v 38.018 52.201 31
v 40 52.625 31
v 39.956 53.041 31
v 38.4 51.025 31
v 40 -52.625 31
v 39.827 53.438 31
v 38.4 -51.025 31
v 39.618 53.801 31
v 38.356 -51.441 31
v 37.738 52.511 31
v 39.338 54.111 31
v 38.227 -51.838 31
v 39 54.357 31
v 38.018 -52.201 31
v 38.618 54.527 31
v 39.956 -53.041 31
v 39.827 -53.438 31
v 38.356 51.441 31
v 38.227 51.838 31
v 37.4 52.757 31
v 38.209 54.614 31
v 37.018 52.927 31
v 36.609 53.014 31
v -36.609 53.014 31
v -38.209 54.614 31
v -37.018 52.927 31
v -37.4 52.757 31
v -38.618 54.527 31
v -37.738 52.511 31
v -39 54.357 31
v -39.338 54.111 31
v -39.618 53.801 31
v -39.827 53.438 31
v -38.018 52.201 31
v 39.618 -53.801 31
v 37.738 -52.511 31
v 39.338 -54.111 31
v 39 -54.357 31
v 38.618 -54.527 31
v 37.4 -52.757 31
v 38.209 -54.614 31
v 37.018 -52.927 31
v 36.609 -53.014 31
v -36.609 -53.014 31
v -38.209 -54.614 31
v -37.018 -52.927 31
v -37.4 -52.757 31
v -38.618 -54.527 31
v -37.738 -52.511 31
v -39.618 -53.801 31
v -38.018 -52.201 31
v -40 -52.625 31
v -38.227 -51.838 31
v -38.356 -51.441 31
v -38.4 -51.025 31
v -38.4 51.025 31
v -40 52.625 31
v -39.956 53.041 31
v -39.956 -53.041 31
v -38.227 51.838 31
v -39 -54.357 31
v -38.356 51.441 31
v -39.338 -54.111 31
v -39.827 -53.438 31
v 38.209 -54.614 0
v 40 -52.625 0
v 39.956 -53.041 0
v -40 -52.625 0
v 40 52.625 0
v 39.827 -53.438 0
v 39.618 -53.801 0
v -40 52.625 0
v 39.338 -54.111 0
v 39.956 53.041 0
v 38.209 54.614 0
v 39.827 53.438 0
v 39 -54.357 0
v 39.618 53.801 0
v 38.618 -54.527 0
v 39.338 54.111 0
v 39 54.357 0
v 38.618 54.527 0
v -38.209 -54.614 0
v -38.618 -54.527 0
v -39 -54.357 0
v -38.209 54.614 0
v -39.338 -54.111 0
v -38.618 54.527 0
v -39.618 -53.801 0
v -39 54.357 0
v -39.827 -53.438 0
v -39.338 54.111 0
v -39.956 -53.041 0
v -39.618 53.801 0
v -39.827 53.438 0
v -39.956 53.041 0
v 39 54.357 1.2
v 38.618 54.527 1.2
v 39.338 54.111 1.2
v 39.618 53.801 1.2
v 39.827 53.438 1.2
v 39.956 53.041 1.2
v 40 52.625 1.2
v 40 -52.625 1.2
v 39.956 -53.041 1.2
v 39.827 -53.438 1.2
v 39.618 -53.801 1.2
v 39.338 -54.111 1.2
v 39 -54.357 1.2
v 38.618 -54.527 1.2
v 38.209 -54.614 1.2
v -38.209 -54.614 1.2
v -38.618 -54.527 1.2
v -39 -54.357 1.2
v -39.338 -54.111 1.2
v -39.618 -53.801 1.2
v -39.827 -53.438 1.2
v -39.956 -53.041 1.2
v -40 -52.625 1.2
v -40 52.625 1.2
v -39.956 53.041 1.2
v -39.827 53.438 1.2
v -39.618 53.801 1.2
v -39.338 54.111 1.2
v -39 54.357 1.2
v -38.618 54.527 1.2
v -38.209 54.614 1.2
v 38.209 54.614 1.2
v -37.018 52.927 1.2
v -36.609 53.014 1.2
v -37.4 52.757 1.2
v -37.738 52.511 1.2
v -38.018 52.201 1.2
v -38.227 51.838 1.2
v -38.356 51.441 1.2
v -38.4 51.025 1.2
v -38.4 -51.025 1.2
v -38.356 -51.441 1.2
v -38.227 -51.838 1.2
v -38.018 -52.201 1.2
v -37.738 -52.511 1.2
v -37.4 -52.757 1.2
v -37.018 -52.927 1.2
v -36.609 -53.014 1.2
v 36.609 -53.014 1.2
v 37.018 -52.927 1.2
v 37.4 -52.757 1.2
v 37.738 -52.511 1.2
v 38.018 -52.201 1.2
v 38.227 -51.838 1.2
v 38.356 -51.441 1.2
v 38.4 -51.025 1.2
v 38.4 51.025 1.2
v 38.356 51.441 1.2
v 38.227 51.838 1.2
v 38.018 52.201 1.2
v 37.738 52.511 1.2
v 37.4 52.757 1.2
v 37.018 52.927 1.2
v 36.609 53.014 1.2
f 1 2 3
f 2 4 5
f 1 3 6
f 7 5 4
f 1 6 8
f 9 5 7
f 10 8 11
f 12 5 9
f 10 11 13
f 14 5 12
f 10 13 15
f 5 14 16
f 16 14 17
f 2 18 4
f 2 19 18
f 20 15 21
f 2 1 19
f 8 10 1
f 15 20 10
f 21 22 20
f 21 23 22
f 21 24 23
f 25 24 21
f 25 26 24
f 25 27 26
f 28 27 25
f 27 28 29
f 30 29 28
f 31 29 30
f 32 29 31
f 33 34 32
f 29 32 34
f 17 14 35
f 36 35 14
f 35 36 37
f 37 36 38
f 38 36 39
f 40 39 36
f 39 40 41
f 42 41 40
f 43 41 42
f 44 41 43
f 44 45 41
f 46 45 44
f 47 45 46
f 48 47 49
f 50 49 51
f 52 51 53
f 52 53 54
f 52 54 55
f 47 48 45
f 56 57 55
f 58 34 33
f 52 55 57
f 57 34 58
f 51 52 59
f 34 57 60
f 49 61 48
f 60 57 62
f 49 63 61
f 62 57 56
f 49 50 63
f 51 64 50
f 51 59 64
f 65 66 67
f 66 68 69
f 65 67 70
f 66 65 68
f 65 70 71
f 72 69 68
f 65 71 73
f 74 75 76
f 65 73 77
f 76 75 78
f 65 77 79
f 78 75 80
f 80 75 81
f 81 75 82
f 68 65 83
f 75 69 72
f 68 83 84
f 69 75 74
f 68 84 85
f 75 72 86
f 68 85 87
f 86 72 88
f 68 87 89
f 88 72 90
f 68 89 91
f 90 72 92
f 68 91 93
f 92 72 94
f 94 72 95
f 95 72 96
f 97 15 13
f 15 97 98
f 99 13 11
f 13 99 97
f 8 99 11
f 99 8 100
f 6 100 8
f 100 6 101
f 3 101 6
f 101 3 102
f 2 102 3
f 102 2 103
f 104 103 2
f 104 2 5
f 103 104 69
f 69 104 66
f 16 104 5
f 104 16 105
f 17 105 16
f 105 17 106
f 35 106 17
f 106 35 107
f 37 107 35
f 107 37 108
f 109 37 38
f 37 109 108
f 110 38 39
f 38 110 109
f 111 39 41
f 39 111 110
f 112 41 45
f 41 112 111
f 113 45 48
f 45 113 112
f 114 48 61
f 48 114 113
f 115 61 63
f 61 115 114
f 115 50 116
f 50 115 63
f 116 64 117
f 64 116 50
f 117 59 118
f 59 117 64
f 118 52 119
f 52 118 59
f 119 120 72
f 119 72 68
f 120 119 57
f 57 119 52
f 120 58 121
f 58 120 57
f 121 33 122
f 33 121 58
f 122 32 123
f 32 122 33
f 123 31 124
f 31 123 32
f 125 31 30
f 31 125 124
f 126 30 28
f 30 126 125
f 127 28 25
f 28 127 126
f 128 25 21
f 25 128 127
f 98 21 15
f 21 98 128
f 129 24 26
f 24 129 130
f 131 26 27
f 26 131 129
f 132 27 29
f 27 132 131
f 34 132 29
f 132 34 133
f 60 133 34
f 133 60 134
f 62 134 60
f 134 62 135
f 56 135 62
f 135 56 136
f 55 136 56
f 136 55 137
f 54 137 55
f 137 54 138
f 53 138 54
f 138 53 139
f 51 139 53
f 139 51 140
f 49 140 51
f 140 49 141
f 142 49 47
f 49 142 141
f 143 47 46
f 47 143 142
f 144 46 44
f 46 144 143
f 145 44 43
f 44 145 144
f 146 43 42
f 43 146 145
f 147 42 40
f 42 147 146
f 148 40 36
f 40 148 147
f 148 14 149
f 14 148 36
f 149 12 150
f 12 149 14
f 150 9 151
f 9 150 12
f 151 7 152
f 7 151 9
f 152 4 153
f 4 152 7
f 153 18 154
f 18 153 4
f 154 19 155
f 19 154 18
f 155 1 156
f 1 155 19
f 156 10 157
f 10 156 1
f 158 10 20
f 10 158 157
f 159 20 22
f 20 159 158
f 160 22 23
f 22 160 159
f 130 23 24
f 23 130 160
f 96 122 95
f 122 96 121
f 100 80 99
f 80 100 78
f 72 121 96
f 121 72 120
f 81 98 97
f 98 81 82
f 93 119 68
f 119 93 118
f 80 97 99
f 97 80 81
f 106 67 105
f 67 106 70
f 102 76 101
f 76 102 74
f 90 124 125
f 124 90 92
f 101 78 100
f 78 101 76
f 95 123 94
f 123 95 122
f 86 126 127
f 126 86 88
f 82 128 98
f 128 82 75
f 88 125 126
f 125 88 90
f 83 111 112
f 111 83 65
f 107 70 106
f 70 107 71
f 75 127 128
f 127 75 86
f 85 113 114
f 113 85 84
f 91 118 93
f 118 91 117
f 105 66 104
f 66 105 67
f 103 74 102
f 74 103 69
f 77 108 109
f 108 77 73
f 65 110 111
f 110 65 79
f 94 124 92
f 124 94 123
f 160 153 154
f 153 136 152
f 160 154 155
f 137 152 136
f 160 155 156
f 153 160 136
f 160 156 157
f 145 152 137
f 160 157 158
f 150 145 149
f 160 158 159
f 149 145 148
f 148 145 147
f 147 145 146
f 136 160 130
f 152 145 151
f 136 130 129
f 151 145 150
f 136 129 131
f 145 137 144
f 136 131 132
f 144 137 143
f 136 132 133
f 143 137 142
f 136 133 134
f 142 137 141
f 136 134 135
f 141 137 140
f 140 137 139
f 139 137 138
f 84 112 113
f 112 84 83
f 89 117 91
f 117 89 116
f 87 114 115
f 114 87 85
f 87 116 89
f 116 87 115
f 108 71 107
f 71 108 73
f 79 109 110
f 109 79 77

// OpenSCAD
// file: bintools.scad
/* bintools.scad
 *
 * Copyright (C) Robert B. Ross, 2016
 *
 * This software is released under the Creative Commons
 * Attribution-ShareAlike 4.0 International Public License.
 */

// Harbor Frieght Medium
// 46.5mm tall
// 48.6mm tall with legs
// 80mm wide, 77 bottom
// 54mm length, 52 bottom

/* harborFreightMediumFullHt(locations)
 *
 * locations -- an array of pairs of triples specifying a translation and rotation of the children().
 *              e.g., locations = [[[0,0,0], [0,0,0]],
 *                                 [[5.5, 21.3,0], [0,0,0]],
 *                                 [[-5.5, -21.3, 0],[0,0,0]]];
 *
 * outlineScale -- scaling of the region around the blank. 1.2 is default.
 *
 * Dimensions (from Kariko83)
 *   46.5mm tall
 *   48.6mm tall with legs
 *   80mm wide, 77mm bottom
 *   54mm length, 52mm bottom
 */
module harborFreightMediumFullHt(locations=[]) {
   solidBottomBox(xDim=54,yDim=80,ht=46.5,locations=locations) children();
}

/* harborFreightLargeHalfHt(locations)
 *
 * See above for description of locations variable
 *
 * Dimensions (from Kariko83)
 *   46.5mm tall
 *   48.6mm tall with legs
 *   109.25mm wide
 *   80mm length
 */
module harborFreightLargeHalfHt(locations=[]) {
   solidBottomBox(xDim=80,yDim=109.25,ht=46.5/2,locations=locations) children();
}

module harborFreightLargeThirdHt(locations=[]) {
   solidBottomBox(xDim=80,yDim=109.25,ht=46.5/3,locations=locations) children();
}

module harborFreightLargeTwoThirdHt(locations=[]) {
   solidBottomBox(xDim=80,yDim=109.25,ht=2*46.5/3,locations=locations) children();
}



/* solidBottomBox() -- generate a rounded, solid-bottom box with children used to generate slots for holding ships.
 *
 * locations -- an array of pairs of triples specifying a translation and rotation of the children().
 *              e.g., locations = [[[0,0,0], [0,0,0]],
 *                                 [[5.5, 21.3,0], [0,0,0]],
 *                                 [[-5.5, -21.3, 0],[0,0,0]]];
 *
 * outlineScale -- scaling of the region around the blank. 1.2 is default.
 *
 * NOTE: Assumes that children are "upside down" (i.e., the XY plane is meant to be top of box) so that
 *       models can drop in "bottom up".
 */
module solidBottomBox(xDim=10,xDim=10,ht=10,locations=[],outlineScale=1.2) {
   offsetFromTop = 0.1; /* amount of space to move the outline from the top of the form; helps keep model clean */

   /* flip right-side up and place on XY plane */
   translate([0,0,ht]) rotate([180,0,0]) {
      /* parallel-sided box, complete bottom */
      roundShapedBox(xDimTop=xDim, yDimTop=yDim, xDimBottom=xDim,
                     yDimBottom=yDim, ht=ht, wallThick=1.6);
      translate([0,0,ht-1.2]) roundBoxBottom(xDim=xDim,yDim=yDim,ht=1.2);

      /* spaces to hold ships */
      difference() {
         union() {
            /* base form */
            for (loc = locations) {
                translate([0,0,offsetFromTop]) translate(loc[0]) rotate(loc[1])
                   blankOutline(height=ht-offsetFromTop, outlineScale=outlineScale) children();
            }
         }
         union() {
            /* what will be differenced out */
            for (loc = locations) {
                translate(loc[0]) rotate(loc[1]) children();
            }
         }
      }
   }
}


/* blankCutout() - extrudes an outline of children() to a given height
 *                 and then difference()s out the children(), leaving
 *                 only the outline.
 */
module blankCutout(height=48.6, epsilon=0.1, outlineScale=1.4) {
   difference() {
      translate([0,0,epsilon]) linear_extrude(height=height-epsilon)
         outline(outlineScale=outlineScale) projection(cut=false) children();
      children();
   }
}

/* blankOutline() - extrudes an outline (enclosing form) of children()
 *                  to a given height.
 *
 * Notes: Intended to allow for taking a form (the "blank") and create a
 *        supporting shape around it.
 */
module blankOutline(height=48.6) {
   linear_extrude(height=height) outline() projection(cut=false) children();
}


/* outline() - generates an outline of an object
 *
 * Note: This is intended to be used on a 2D shape, such as one created
 *       using the projection() operator.
 */
module outline(outlineIterations = 30,outlineScale=1.4) {
   for (i=[0:outlineIterations]) {
      translate([outlineScale*cos(360*i/outlineIterations),
                 outlineScale*sin(360*i/outlineIterations),0]) children();
   }
}

/* roundBox() - rounded corner box
 */
module roundBox(cornerRad=2,xDim=10,yDim=10,ht=10,wallThick=1.2) {
   linear_extrude(height=ht) difference() {
      hull() {
         translate([xDim/2-cornerRad,
                    yDim/2-cornerRad,0]) circle(r=cornerRad);
         translate([-1*xDim/2+cornerRad,
                    yDim/2-cornerRad,0]) circle(r=cornerRad);
         translate([xDim/2-cornerRad,
                    -1*yDim/2+cornerRad,0]) circle(r=cornerRad);
         translate([-1*xDim/2+cornerRad,
                    -1*yDim/2+cornerRad,0]) circle(r=cornerRad);
      }
      hull() {
         translate([xDim/2-cornerRad-wallThick,
                    yDim/2-cornerRad-wallThick,0]) circle(r=cornerRad);
         translate([-1*xDim/2+cornerRad+wallThick,
                    yDim/2-cornerRad-wallThick,0]) circle(r=cornerRad);
         translate([xDim/2-cornerRad-wallThick,
                    -1*yDim/2+cornerRad+wallThick,0]) circle(r=cornerRad);
         translate([-1*xDim/2+cornerRad+wallThick,
                    -1*yDim/2+cornerRad+wallThick,0]) circle(r=cornerRad);
      }
   }
}

/* roundBoxBottom() - rounded corner box bottom
 */
module roundBoxBottom(cornerRad=2,xDim=10,yDim=10,ht=10) {
   linear_extrude(height=ht) hull() {
      translate([xDim/2-cornerRad,
                 yDim/2-cornerRad,0]) circle(r=cornerRad);
      translate([-1*xDim/2+cornerRad,
                 yDim/2-cornerRad,0]) circle(r=cornerRad);
      translate([xDim/2-cornerRad,
                 -1*yDim/2+cornerRad,0]) circle(r=cornerRad);
      translate([-1*xDim/2+cornerRad,
                 -1*yDim/2+cornerRad,0]) circle(r=cornerRad);
   }
}

/* roundShapedBox() - rounded corner box that tapers
 *
 * Note: In typical use for these bins, the *bottom* of this box ends up
 *       being the top of the bin.
 */
module roundShapedBox(cornerRad=2,
                      xDimTop=54,
                      yDimTop=80,
                      xDimBottom=52,
                      yDimBottom=77,
                      ht=46.5/2,
                      wallThick=2)
{
   linear_extrude(height=ht,
                  scale=[xDimTop/xDimBottom,yDimTop/yDimBottom])
   difference() {
      hull() {
         translate([xDimBottom/2-cornerRad,
                    yDimBottom/2-cornerRad,0]) circle(r=cornerRad);
         translate([-1*xDimBottom/2+cornerRad,
                    yDimBottom/2-cornerRad,0]) circle(r=cornerRad);
         translate([xDimBottom/2-cornerRad,
                    -1*yDimBottom/2+cornerRad,0]) circle(r=cornerRad);
         translate([-1*xDimBottom/2+cornerRad,
                    -1*yDimBottom/2+cornerRad,0]) circle(r=cornerRad);
      }
      hull() {
         translate([xDimBottom/2-cornerRad-wallThick,
                    yDimBottom/2-cornerRad-wallThick,0]) circle(r=cornerRad);
         translate([-1*xDimBottom/2+cornerRad+wallThick,
                    yDimBottom/2-cornerRad-wallThick,0]) circle(r=cornerRad);
         translate([xDimBottom/2-cornerRad-wallThick,
                    -1*yDimBottom/2+cornerRad+wallThick,0]) circle(r=cornerRad);
         translate([-1*xDimBottom/2+cornerRad+wallThick,
                    -1*yDimBottom/2+cornerRad+wallThick,0]) circle(r=cornerRad);
      }
   }
}

/*
 * Local variables:
 *  mode: C
 *  c-indent-level: 4
 *  c-basic-offset: 4
 * End:
 *
 * vim: ts=8 sts=4 sw=4 expandtab
 */
// main file
/* large-bin.scad
 *
 * Copyright (C) Robert B. Ross, 2016
 *
 * This software is released under the Creative Commons
 * Attribution-ShareAlike 4.0 International Public License.
 */

$fn=30;

include <./bintools.scad>

// harborFreightLargeHalfHt(locations=[]);
// harborFreightLargeThirdHt(locations=[]);
harborFreightLargeTwoThirdHt(locations=[]);

/*
 * Local variables:
 *  mode: C
 *  c-indent-level: 4
 *  c-basic-offset: 4
 * End:
 *
 * vim: ts=8 sts=4 sw=4 expandtab
 */
